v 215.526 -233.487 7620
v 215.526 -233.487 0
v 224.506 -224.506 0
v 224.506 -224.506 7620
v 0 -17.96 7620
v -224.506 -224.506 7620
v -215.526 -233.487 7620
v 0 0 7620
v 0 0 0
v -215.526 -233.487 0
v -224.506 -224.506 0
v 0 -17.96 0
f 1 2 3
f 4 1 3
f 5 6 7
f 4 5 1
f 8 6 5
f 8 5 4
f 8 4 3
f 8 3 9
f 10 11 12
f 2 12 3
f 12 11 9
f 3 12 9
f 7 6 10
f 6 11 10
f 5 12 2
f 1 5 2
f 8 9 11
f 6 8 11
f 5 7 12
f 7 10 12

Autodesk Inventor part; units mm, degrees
ref_plane "YZ Plane" through (0, 0, 0) normal (1, 0, 0) x (0, 1, 0)
ref_plane "XZ Plane" through (0, 0, 0) normal (0, 1, 0) x (-1, 0, 0)
ref_plane "XY Plane" through (0, 0, 0) normal (0, 0, 1) x (1, 0, 0)
sketch "Sketch1" plane through (0, 0, 0) normal (0, 0, 1) x (1, 0, 0)
  line L0 (0, 0) -> (-224.5064, -224.5064)
  line L1 (-224.5064, -224.5064) -> (-215.5261, -233.4867)
  line L2 (-215.5261, -233.4867) -> (0, -17.9605)
  line L3 (0, -17.9605) -> (215.5261, -233.4867)
  line L4 (215.5261, -233.4867) -> (224.5064, -224.5064)
  line L5 (224.5064, -224.5064) -> (0, 0)
  line L6 (215.5261, -233.4867) -> (-215.5261, -233.4867)
  dimension "d0" = 12.7
  dimension "d4" = 304.8
extrude "Extrusion1" add sketch "Sketch1" along normal blind 7620 contours L5 L4 L3 L2 L1 L0
properties part number "Shingles_On_Ridge_Vent" material "Steel"
